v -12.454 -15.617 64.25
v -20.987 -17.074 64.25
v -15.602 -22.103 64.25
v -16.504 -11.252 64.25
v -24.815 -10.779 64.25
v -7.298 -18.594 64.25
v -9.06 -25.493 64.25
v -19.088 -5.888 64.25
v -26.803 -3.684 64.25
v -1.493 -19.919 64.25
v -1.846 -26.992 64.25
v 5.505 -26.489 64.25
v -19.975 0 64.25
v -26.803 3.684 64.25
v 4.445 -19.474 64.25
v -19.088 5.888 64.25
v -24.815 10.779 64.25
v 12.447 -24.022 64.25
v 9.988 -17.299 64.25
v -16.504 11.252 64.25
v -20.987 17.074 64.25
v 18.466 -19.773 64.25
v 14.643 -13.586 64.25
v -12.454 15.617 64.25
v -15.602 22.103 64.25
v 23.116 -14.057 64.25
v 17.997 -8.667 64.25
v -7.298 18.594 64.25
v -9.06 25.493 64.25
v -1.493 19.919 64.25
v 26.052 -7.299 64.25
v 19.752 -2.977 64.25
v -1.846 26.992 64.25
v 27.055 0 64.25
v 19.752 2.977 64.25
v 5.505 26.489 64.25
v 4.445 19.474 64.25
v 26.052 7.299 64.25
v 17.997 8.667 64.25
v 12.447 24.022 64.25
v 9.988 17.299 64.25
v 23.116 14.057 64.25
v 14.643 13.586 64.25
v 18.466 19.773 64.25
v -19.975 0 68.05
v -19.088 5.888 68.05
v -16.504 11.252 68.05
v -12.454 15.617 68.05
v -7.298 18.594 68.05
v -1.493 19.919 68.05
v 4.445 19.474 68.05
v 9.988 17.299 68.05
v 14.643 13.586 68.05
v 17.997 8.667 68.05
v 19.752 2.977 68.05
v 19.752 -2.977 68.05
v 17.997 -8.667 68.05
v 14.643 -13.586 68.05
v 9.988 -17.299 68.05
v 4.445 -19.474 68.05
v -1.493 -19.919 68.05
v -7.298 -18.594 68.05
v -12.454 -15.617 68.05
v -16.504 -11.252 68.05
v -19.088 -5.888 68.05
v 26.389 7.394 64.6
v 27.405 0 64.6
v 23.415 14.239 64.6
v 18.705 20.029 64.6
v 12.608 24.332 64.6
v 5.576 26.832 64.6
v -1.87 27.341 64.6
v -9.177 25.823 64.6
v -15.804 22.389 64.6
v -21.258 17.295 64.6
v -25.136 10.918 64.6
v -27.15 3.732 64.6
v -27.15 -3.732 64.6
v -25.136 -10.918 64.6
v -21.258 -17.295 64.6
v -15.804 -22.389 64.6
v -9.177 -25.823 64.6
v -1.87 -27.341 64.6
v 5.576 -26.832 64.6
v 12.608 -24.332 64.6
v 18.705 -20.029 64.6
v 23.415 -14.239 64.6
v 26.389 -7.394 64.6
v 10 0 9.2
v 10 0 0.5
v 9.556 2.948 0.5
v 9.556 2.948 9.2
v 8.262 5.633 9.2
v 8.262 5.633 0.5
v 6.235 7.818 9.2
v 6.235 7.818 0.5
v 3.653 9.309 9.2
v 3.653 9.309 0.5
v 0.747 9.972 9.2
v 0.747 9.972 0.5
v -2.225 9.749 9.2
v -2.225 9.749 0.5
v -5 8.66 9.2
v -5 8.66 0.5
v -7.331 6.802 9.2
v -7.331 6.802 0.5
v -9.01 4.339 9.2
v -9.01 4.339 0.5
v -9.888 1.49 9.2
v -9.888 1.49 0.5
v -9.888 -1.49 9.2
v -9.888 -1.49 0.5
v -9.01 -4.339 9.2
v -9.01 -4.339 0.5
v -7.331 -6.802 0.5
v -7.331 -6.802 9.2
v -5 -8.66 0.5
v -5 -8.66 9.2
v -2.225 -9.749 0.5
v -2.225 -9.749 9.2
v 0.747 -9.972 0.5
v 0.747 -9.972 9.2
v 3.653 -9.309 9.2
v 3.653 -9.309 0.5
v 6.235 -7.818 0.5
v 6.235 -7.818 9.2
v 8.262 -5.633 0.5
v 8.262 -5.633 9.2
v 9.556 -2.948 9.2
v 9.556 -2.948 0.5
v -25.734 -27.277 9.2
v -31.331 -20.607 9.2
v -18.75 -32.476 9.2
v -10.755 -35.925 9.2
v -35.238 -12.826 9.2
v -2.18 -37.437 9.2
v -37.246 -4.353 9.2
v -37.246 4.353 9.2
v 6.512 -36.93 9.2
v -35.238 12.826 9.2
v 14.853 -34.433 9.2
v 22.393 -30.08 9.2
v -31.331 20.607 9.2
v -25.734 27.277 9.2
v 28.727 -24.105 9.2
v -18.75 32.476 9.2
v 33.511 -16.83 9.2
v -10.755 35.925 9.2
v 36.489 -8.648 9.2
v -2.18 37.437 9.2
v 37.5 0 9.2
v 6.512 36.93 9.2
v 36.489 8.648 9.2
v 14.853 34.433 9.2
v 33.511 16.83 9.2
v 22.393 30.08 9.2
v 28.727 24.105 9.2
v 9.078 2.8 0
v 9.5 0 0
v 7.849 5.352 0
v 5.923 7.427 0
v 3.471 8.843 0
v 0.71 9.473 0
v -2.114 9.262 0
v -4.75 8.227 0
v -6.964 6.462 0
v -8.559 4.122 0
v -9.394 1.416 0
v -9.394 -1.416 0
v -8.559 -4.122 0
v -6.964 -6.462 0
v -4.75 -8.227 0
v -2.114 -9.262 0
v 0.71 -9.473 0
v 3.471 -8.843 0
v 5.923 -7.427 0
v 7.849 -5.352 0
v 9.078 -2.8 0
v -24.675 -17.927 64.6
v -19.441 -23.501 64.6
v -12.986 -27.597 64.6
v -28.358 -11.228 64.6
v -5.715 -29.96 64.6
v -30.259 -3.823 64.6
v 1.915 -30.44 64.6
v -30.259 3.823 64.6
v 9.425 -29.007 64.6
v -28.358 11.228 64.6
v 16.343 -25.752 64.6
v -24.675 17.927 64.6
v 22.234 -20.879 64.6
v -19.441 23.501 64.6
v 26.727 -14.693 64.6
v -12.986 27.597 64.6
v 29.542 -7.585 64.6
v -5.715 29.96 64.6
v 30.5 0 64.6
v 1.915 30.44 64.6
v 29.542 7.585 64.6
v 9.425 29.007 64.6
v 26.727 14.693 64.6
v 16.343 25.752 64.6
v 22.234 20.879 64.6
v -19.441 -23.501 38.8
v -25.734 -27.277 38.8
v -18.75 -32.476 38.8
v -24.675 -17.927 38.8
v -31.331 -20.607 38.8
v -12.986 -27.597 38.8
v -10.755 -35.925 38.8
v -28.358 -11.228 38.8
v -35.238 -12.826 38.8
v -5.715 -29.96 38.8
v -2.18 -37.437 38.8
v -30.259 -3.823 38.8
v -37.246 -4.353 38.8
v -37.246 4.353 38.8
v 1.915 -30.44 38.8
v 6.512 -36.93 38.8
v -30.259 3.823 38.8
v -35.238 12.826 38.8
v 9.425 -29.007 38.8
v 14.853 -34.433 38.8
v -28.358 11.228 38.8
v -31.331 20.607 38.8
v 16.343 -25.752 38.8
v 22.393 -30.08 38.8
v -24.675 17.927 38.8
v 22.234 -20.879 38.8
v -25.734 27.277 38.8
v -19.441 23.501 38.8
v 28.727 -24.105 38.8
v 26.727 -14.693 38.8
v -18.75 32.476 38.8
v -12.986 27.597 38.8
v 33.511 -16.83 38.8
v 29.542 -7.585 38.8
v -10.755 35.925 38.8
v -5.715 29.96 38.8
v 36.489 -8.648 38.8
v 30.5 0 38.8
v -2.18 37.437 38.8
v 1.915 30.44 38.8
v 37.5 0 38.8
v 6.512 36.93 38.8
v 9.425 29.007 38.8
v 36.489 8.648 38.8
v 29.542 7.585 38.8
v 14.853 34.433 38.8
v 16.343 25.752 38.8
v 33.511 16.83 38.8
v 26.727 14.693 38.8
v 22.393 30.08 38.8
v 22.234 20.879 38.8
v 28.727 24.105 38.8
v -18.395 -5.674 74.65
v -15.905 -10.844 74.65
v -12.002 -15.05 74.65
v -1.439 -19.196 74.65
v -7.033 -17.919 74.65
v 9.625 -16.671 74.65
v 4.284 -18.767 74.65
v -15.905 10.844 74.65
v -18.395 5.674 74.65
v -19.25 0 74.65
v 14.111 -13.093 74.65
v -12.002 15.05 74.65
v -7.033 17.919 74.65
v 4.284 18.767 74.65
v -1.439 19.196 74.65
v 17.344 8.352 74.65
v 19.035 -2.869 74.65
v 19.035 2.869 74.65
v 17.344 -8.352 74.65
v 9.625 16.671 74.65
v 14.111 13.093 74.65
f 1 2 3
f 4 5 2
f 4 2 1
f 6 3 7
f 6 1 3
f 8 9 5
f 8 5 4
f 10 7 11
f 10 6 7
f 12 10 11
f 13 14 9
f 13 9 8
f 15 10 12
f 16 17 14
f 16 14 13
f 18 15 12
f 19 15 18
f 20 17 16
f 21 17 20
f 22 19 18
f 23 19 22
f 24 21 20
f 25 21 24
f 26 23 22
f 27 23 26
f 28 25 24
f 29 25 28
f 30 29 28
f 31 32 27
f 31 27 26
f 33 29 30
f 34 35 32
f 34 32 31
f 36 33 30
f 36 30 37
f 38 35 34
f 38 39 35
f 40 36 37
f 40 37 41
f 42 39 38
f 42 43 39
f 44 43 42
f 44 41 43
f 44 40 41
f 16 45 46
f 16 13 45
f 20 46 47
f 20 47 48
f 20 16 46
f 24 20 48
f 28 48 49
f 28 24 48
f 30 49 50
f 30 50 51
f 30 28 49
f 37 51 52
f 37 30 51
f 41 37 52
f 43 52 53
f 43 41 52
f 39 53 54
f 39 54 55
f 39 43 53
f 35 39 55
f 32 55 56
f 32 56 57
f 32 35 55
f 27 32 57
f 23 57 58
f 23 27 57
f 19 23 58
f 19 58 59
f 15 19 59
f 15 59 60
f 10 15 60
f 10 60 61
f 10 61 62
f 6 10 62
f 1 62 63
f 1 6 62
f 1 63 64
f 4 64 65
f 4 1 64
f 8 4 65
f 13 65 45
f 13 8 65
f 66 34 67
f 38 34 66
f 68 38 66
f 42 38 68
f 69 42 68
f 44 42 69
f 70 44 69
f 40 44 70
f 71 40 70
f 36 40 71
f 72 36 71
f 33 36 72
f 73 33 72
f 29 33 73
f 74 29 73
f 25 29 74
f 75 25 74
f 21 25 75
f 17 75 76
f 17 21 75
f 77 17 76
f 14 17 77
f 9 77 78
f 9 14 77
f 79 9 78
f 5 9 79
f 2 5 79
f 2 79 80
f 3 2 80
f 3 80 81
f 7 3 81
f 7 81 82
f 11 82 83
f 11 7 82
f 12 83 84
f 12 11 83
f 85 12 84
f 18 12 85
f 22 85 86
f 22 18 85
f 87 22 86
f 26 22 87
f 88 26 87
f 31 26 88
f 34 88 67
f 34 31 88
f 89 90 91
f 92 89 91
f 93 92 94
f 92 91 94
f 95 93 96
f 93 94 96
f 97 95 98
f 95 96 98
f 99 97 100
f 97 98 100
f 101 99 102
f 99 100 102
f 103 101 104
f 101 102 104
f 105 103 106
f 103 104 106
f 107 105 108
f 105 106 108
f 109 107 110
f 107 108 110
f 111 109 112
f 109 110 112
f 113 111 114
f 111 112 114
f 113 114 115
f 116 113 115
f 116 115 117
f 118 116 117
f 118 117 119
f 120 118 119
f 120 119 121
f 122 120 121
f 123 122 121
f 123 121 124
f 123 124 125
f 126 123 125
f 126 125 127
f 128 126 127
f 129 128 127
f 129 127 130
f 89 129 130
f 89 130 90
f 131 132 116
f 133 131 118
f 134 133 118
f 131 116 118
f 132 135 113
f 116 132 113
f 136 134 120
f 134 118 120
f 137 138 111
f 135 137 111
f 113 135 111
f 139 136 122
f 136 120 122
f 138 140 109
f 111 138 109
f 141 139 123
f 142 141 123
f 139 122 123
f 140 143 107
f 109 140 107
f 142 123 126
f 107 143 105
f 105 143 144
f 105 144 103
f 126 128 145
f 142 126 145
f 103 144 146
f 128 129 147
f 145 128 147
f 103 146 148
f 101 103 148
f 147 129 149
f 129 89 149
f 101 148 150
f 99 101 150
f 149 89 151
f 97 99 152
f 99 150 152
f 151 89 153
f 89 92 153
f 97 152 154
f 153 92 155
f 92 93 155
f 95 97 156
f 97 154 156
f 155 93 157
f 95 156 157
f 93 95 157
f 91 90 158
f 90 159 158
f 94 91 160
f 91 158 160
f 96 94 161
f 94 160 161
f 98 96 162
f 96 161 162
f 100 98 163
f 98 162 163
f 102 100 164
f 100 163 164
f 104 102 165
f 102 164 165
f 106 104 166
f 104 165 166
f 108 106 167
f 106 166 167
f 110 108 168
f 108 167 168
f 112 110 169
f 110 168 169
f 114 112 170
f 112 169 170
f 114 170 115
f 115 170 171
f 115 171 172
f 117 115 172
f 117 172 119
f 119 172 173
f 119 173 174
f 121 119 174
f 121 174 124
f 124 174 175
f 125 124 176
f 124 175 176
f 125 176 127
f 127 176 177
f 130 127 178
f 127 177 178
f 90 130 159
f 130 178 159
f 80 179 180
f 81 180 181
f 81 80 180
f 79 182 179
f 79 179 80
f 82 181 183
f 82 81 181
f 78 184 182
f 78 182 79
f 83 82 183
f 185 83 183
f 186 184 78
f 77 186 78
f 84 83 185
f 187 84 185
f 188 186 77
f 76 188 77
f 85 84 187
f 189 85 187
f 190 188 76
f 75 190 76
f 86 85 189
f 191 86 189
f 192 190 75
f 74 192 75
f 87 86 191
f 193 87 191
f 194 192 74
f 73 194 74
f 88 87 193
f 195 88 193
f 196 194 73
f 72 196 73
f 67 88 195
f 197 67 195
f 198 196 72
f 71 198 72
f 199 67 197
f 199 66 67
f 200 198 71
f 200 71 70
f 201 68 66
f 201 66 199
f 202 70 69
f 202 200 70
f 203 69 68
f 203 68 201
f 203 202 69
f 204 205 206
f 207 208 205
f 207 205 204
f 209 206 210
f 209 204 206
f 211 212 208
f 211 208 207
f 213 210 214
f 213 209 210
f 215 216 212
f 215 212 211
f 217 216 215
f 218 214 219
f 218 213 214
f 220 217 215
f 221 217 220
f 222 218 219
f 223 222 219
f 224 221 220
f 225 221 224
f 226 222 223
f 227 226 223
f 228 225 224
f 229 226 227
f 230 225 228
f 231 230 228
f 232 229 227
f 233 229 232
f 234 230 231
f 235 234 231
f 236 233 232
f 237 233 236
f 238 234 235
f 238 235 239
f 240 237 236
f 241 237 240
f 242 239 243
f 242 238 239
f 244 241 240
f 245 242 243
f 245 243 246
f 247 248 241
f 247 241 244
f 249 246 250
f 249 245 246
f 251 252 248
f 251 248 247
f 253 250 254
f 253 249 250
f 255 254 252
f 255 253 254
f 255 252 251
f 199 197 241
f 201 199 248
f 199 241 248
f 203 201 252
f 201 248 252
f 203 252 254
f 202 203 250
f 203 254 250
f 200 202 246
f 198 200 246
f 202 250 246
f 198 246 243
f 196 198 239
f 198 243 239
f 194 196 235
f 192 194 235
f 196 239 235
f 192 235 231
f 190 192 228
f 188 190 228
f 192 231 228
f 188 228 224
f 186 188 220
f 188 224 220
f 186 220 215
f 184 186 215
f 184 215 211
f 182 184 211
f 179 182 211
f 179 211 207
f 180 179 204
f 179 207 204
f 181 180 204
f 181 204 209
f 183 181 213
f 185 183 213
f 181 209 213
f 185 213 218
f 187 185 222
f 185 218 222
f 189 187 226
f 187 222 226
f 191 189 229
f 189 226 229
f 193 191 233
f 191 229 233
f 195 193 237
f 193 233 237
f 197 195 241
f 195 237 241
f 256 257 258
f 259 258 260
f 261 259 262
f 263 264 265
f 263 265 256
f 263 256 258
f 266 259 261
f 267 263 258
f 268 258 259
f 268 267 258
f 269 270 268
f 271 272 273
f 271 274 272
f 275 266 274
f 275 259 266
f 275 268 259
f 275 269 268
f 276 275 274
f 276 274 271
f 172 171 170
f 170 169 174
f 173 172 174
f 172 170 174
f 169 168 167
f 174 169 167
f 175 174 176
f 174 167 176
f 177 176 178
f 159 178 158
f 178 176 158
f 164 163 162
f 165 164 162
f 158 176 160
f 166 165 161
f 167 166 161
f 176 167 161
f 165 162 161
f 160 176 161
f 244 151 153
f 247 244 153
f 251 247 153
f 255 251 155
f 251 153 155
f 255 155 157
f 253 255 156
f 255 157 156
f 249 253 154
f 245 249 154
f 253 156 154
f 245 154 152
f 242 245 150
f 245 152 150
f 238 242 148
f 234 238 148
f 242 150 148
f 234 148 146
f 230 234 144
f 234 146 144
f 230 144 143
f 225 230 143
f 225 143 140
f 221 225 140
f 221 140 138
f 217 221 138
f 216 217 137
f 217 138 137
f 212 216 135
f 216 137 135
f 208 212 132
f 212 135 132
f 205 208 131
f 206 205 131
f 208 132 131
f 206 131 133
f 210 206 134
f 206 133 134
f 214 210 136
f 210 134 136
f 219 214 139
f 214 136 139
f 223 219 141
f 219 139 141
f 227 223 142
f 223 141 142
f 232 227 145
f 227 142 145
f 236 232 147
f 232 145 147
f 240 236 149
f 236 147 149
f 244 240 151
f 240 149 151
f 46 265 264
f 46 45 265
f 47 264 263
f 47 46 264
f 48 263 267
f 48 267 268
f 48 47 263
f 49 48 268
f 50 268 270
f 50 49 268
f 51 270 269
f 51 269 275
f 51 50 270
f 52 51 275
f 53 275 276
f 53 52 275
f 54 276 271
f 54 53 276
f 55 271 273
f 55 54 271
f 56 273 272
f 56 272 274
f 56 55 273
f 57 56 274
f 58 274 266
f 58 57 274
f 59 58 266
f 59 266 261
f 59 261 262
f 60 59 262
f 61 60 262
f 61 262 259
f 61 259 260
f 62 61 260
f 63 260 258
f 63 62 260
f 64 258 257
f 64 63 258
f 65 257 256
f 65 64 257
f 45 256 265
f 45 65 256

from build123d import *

# Parameters (mm, degrees)
F1_R     = 10
F2_DEPTH = 9.2
F3_R     = 37.5
F4_DEPTH = 29.6
F5_R     = 30.5
F6_DEPTH = 25.8
F7_R     = 26.905
F8_DEPTH = 0.35


# Not quite as in the source:
# - a fillet or chamfer that OpenCascade refuses, or shapes differently, is made with other operations: its cross-section is extruded or revolved along the edge and cut away or added


with BuildPart() as f2:
    # F1 (on Top) → F2 (new body)
    with BuildSketch(Plane.XY):
        Circle(F1_R)
    extrude(amount=F2_DEPTH)

    # F3 (on face) → F4 (join)
    with BuildSketch(Plane.XY.offset(9.2)):
        Circle(F3_R)
    extrude(amount=F4_DEPTH)

    # F5 (on face) → F6 (join)
    with BuildSketch(Plane.XY.offset(38.8)):
        Circle(F5_R)
    extrude(amount=F6_DEPTH)

    # F7 (on face) → F8 (cut)
    with BuildSketch(Plane.XY.offset(64.6)):
        Circle(F7_R)
    extrude(amount=-F8_DEPTH, mode=Mode.SUBTRACT)

    # F10: chamfer of 0.5 on 2 edges, made by hand


with BuildPart() as f10_tool2:
    # F10_s3 → F10_t4 (revolve)
    with BuildSketch(Plane.XZ):
        Polygon((27.405, 64.6), (26.905, 64.1), (26.905, 64.6), align=None)
    revolve(axis=Axis((0, 0, 64.6), (0, 0, 1)))

    split(bisect_by=Plane.XY.offset(64.25), keep=Keep.TOP)


with BuildPart() as f2_1:
    add(f2.part)

    # F10_t1: cut F10_tool2
    add(f10_tool2.part, mode=Mode.SUBTRACT)

    # F10_s6 → F10_t7 (revolve, cut)
    with BuildSketch(Plane.XZ):
        Polygon((10, 0.5), (9.5, 0), (10, 0), align=None)
    revolve(axis=Axis((0, 0, 0), (0, 0, 1)), mode=Mode.SUBTRACT)

    # F11 (on Front) → F12 (revolve)
    with BuildSketch(Plane.XZ):
        Polygon((0, 64.25), (0, 74.65), (-19.25, 74.65), (-19.975, 68.05), (-19.975, 64.25), align=None)
    revolve(axis=Axis((0, 0, 44.8884957004), (0, 0, -1)))


solid = f2_1.part
